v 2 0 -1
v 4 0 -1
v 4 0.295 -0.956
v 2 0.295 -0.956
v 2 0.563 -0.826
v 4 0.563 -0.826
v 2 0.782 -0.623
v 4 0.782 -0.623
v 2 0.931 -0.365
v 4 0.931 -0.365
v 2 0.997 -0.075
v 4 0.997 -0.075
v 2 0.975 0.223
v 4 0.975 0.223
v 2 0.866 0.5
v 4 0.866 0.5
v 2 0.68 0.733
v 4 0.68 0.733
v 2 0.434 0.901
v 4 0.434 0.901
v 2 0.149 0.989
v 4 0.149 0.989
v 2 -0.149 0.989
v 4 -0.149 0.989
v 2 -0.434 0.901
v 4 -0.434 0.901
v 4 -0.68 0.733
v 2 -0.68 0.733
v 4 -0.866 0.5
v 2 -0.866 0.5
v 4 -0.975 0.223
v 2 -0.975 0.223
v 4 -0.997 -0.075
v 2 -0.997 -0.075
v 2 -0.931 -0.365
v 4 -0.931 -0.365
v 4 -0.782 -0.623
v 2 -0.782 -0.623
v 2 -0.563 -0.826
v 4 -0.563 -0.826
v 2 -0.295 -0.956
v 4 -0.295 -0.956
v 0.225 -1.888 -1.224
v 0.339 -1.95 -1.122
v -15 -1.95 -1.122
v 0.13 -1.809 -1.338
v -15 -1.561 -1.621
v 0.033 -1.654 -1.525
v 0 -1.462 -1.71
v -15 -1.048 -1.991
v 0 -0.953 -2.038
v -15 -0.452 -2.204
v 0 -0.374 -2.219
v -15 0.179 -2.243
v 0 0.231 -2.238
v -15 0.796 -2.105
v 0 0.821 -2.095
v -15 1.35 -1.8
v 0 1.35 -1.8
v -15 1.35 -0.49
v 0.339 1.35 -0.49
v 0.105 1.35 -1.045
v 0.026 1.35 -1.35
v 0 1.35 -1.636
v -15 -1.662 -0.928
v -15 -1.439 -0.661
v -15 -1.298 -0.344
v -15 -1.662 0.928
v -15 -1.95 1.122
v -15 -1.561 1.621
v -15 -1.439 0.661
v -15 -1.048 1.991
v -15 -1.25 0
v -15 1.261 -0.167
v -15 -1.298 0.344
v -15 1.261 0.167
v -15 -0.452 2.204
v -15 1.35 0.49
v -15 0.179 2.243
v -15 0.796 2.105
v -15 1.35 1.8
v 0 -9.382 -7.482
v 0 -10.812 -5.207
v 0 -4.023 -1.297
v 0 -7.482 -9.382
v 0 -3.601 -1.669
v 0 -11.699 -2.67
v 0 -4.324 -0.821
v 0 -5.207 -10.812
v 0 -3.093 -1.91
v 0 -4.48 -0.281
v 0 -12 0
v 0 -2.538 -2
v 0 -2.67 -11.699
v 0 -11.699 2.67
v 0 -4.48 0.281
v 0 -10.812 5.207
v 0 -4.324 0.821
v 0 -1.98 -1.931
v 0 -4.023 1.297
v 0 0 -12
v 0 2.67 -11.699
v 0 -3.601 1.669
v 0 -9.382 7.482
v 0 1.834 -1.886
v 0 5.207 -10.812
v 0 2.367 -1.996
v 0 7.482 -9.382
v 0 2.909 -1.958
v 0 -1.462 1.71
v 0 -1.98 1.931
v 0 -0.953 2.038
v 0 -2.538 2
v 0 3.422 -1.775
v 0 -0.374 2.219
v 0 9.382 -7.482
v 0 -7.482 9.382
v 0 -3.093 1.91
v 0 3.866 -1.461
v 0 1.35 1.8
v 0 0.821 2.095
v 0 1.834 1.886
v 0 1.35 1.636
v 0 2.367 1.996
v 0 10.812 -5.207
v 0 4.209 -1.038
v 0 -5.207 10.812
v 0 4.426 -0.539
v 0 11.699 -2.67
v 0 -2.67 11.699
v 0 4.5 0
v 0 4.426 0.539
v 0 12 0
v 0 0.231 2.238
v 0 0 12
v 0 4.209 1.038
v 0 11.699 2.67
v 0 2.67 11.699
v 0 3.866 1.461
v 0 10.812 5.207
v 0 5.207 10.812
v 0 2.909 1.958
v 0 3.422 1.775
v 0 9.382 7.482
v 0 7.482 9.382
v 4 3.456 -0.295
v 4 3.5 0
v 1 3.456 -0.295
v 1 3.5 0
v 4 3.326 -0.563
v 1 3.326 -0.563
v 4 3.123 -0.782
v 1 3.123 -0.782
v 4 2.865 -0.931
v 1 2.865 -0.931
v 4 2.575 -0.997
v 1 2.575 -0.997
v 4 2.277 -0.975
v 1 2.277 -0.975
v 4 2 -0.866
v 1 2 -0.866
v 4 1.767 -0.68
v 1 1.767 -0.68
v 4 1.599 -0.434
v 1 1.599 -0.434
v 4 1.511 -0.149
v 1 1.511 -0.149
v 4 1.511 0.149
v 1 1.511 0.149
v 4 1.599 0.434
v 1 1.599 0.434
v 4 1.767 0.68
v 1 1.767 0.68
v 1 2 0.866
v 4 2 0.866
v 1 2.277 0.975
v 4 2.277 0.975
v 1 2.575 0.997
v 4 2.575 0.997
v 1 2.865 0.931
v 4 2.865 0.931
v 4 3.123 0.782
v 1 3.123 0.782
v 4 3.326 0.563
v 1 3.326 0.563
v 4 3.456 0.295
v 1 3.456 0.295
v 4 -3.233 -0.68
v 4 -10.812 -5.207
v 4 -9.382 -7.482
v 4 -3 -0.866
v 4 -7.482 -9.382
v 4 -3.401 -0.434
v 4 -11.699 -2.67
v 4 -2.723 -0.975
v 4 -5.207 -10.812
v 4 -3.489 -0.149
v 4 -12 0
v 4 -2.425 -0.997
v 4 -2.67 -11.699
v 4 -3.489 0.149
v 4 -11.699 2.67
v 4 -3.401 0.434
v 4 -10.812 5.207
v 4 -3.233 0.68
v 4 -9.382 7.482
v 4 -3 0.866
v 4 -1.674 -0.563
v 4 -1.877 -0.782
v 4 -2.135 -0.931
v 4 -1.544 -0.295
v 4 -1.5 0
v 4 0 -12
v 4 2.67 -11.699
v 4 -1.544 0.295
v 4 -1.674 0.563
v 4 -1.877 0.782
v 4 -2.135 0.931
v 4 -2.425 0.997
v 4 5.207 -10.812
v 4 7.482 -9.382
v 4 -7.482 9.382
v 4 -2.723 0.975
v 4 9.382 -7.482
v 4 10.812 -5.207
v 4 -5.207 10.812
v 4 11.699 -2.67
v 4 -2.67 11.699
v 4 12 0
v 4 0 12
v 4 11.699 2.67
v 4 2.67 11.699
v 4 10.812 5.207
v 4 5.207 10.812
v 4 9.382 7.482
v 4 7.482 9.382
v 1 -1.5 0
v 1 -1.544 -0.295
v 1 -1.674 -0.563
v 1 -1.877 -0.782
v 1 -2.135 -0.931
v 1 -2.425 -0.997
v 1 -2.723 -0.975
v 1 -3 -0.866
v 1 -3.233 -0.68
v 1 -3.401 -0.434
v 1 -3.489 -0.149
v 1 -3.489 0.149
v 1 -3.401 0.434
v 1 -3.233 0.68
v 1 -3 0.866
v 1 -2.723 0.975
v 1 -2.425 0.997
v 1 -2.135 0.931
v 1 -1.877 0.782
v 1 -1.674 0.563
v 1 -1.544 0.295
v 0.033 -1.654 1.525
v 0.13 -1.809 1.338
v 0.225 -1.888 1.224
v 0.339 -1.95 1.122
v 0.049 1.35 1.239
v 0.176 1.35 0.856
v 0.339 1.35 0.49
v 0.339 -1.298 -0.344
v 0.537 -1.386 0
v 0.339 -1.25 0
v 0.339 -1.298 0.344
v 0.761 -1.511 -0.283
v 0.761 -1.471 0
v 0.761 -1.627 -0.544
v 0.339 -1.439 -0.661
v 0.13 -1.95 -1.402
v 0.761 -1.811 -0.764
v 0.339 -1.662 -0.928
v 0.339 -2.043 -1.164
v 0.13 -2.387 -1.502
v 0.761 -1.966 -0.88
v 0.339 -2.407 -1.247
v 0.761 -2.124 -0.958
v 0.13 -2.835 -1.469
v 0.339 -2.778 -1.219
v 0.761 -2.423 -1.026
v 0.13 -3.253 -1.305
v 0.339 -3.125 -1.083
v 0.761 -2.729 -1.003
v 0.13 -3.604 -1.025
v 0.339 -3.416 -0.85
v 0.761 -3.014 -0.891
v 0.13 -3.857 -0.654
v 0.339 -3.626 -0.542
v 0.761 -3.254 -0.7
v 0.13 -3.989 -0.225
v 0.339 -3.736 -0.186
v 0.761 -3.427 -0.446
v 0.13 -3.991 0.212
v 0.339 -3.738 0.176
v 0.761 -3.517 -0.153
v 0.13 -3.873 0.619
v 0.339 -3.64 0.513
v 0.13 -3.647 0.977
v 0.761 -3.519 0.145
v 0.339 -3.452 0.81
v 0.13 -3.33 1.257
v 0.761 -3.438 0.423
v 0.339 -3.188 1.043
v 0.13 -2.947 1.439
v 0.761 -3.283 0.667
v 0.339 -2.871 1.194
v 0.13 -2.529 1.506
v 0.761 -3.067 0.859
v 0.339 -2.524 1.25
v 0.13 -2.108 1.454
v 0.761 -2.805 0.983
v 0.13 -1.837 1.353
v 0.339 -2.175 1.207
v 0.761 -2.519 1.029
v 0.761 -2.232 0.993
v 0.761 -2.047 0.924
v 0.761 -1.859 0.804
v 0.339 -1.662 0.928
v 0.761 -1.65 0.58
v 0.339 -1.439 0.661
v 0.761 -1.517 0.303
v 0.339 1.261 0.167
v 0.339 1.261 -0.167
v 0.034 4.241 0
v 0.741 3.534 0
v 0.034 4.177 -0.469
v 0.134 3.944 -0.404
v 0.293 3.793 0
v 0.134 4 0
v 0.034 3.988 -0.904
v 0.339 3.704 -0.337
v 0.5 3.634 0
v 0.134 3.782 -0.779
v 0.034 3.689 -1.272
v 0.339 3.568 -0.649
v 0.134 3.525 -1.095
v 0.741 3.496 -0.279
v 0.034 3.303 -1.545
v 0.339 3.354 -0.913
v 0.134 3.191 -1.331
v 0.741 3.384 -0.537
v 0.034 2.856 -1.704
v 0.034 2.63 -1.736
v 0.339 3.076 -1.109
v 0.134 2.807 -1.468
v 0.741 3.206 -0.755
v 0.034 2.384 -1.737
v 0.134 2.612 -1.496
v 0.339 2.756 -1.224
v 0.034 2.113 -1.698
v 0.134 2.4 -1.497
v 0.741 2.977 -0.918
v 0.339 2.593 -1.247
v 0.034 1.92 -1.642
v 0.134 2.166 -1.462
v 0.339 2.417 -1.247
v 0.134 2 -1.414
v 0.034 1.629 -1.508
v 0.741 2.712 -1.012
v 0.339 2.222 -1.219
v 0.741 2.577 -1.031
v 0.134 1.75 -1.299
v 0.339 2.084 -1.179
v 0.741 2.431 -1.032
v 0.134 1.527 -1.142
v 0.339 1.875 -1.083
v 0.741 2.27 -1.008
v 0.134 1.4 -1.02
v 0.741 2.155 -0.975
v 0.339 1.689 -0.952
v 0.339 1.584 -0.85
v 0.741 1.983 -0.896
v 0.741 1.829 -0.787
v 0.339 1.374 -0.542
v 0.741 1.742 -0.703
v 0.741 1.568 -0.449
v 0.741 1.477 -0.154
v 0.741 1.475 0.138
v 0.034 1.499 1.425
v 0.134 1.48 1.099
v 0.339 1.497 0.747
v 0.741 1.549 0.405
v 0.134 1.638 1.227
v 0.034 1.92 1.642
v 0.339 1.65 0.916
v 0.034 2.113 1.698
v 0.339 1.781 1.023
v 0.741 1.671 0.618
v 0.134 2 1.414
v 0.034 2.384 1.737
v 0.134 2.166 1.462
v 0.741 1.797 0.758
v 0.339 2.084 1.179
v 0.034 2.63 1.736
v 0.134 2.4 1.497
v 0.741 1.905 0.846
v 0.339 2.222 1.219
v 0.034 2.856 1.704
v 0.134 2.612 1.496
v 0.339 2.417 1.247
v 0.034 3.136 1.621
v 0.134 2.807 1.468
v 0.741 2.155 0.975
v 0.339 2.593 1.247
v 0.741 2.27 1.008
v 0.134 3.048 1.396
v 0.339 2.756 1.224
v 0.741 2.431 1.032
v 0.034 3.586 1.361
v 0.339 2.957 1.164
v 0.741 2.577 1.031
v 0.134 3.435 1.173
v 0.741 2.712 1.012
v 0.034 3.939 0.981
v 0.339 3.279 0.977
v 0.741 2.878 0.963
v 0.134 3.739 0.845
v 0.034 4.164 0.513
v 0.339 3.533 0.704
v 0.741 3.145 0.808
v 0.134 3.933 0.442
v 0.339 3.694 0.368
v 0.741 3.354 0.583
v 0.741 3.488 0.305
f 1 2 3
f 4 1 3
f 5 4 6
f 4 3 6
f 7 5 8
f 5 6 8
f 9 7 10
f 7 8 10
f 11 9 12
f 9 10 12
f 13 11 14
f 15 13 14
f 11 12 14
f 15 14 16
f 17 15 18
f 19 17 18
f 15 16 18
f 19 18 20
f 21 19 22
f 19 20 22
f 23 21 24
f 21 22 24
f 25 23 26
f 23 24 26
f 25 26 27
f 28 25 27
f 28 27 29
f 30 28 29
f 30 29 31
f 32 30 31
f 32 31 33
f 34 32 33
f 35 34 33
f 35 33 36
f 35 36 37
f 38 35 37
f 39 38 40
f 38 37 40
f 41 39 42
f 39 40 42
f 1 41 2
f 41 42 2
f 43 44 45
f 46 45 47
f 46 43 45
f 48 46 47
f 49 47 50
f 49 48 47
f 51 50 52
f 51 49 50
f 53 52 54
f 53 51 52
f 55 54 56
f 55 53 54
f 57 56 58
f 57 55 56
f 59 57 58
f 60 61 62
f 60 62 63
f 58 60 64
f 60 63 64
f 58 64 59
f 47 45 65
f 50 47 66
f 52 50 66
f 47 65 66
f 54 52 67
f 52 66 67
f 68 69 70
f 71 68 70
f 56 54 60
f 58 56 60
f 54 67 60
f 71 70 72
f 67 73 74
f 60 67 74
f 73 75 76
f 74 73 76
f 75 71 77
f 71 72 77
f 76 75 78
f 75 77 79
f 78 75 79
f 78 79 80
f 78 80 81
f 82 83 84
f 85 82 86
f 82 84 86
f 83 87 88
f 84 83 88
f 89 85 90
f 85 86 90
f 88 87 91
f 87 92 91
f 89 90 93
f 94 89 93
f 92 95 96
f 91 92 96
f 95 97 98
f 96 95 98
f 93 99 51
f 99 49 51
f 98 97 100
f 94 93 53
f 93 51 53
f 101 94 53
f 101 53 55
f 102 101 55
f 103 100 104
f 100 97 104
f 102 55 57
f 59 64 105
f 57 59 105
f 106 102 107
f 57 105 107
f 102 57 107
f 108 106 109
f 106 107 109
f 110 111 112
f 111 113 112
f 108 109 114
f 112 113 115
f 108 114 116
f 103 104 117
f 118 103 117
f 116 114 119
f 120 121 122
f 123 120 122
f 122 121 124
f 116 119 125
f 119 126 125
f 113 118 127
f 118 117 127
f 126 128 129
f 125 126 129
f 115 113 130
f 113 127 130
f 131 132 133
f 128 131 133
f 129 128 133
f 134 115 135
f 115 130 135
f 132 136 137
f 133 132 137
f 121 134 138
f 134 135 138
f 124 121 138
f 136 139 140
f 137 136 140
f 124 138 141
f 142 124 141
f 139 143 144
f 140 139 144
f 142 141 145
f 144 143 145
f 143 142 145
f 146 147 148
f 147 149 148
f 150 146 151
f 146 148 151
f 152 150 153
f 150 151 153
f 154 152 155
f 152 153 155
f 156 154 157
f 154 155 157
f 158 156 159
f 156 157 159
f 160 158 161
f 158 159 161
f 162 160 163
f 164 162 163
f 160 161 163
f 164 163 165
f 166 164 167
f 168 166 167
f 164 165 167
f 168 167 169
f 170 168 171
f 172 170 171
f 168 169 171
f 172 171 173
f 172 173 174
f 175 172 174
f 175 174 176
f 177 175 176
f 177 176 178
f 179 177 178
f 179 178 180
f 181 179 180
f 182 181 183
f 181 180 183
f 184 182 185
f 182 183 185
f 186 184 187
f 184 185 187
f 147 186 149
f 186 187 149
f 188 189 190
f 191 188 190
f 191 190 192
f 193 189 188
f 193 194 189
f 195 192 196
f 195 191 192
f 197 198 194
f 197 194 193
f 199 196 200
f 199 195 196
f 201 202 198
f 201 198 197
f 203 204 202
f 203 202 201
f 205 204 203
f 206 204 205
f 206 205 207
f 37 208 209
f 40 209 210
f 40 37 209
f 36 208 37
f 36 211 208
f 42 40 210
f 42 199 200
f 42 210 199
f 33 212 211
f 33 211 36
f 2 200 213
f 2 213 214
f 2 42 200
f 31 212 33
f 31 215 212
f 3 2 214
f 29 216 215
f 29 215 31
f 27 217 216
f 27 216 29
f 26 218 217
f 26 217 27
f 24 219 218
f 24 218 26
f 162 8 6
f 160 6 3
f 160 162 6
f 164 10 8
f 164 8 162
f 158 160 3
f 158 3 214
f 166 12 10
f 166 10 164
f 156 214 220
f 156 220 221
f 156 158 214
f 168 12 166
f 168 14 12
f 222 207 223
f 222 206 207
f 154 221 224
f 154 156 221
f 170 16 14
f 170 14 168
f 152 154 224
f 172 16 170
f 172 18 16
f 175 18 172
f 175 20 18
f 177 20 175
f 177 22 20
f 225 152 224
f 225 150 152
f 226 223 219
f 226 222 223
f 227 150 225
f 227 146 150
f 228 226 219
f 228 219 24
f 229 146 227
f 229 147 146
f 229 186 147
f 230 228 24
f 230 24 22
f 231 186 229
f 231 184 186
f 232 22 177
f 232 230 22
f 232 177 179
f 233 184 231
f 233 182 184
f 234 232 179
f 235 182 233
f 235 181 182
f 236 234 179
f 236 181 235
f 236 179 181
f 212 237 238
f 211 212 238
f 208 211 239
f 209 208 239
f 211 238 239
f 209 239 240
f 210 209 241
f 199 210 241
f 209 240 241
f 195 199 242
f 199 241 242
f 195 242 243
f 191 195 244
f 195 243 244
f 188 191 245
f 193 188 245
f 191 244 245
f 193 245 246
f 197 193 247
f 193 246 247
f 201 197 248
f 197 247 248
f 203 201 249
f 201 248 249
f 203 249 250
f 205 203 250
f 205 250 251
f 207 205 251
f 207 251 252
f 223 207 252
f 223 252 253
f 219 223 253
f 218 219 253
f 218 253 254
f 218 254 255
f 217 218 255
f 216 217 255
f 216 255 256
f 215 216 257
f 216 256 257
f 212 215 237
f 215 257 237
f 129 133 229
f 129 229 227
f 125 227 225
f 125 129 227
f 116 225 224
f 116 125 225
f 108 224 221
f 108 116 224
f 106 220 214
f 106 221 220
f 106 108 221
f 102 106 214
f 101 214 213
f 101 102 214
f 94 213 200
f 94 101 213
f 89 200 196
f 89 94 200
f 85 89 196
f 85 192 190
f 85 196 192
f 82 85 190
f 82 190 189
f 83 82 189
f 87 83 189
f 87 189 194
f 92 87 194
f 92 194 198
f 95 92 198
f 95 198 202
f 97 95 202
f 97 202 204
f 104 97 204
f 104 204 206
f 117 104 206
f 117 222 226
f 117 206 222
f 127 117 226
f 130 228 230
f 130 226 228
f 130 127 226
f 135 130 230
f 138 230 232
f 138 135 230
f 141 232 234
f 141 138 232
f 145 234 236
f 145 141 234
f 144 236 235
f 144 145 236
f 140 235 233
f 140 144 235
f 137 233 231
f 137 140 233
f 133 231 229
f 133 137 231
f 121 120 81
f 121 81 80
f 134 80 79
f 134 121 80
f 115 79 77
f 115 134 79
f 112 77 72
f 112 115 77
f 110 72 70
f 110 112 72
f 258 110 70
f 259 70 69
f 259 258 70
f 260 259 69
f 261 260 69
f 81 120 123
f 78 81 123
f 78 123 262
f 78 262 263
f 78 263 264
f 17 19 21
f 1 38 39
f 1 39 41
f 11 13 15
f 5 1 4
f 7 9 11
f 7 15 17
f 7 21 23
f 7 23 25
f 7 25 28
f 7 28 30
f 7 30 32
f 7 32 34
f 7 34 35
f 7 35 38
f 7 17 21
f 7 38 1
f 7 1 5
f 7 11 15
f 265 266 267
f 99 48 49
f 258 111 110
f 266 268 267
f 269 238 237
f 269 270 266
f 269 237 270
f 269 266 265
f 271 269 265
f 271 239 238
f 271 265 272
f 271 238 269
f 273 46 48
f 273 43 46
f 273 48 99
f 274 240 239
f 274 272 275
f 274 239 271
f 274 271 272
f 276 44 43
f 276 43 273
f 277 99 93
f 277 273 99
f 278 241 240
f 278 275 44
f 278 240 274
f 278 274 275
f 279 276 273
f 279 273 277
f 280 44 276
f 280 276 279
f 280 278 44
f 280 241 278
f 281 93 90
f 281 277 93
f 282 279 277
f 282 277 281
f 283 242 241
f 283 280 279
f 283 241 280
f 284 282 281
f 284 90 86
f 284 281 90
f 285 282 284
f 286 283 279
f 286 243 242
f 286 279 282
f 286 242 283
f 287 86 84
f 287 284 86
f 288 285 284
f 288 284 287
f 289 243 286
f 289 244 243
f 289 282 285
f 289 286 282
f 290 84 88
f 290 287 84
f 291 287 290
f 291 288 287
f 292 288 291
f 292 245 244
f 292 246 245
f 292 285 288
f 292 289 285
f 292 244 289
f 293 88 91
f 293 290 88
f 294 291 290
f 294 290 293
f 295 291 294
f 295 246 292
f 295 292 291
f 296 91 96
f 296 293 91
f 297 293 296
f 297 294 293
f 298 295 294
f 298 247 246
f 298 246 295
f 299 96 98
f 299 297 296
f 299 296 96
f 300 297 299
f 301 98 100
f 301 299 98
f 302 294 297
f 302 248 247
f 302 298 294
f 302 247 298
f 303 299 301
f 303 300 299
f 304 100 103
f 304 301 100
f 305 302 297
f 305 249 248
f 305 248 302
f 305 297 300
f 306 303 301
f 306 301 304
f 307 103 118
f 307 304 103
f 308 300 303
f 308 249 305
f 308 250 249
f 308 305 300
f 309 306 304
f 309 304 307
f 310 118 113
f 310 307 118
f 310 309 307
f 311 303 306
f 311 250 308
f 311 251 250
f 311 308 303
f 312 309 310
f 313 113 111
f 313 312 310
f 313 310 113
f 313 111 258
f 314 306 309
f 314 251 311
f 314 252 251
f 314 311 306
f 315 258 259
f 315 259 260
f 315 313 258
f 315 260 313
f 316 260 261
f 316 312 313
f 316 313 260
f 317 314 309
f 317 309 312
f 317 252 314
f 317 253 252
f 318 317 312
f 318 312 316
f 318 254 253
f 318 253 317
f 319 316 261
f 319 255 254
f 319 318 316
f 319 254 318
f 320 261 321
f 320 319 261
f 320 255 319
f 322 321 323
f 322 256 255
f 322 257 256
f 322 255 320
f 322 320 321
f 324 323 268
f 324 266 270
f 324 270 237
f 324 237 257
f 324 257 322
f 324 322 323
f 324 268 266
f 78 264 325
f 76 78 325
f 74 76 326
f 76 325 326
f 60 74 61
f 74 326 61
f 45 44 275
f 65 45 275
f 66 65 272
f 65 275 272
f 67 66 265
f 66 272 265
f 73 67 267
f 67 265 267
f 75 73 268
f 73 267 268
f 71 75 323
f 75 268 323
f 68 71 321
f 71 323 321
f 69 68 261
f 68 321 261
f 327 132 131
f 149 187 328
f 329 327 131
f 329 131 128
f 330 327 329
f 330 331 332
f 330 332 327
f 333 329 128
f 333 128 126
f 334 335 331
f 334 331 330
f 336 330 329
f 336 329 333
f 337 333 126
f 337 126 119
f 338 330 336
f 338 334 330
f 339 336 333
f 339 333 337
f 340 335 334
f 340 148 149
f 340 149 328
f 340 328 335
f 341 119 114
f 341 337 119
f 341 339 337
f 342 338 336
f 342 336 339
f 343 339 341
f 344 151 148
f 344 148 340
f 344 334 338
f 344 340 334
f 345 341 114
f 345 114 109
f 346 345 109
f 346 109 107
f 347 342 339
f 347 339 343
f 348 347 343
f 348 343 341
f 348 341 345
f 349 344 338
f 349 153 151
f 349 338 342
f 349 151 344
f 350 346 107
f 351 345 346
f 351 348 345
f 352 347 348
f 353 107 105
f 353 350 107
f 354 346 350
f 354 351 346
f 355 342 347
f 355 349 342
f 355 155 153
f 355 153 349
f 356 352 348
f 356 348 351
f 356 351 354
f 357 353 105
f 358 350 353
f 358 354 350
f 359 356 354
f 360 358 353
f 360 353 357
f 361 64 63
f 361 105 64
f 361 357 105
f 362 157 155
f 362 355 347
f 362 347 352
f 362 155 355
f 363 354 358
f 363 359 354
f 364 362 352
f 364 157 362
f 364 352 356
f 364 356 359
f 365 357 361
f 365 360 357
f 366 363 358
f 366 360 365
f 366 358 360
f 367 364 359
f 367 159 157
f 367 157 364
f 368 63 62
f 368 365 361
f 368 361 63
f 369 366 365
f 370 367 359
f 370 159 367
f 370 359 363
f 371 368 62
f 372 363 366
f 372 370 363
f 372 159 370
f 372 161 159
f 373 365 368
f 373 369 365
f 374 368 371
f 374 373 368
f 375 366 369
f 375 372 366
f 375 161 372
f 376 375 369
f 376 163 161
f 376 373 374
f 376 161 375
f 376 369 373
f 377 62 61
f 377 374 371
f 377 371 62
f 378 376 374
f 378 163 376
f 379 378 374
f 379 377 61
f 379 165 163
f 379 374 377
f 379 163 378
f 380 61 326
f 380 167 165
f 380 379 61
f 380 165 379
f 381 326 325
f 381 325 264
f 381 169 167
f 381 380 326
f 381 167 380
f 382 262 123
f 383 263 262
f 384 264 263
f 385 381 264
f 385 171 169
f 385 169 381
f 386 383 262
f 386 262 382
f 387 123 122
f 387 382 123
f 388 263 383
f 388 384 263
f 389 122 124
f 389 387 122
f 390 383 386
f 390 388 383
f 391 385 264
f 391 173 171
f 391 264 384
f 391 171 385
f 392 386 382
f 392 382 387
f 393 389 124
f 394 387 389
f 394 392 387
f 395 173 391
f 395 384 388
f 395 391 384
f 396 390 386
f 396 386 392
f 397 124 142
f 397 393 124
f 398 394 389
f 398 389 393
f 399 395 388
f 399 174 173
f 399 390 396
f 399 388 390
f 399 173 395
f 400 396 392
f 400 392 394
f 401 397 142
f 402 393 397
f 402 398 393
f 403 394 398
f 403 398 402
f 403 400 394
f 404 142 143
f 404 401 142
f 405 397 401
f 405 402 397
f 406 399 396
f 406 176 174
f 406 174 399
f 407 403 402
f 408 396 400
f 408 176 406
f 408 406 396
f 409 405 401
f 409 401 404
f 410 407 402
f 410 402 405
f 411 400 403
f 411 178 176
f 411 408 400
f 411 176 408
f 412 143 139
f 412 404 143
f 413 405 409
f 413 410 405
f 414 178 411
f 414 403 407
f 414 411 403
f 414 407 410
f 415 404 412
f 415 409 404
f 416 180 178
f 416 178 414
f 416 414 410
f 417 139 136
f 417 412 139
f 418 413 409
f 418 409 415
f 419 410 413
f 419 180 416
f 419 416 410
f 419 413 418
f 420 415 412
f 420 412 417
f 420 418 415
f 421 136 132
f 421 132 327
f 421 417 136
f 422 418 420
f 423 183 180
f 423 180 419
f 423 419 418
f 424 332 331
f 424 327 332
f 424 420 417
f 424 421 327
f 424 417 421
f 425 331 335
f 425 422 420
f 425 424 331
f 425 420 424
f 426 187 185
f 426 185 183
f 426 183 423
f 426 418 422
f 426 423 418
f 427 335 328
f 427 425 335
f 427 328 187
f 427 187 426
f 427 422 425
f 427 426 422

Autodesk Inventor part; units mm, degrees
ref_plane "YZ Plane" through (0, 0, 0) normal (1, 0, 0) x (0, 1, 0)
ref_plane "XZ Plane" through (0, 0, 0) normal (0, 1, 0) x (-1, 0, 0)
ref_plane "XY Plane" through (0, 0, 0) normal (0, 0, 1) x (1, 0, 0)
sketch "Sketch1" plane through (0, 0, 0) normal (1, 0, 0) x (0, 1, 0)
  circle A0 centre (0, 0) radius 12
  circle A1 centre (0, 0) radius 2.25
  line L0 (16, 0) -> (-16, 0) construction
  circle A2 centre (-2.5, 0) radius 1
  circle A3 centre (2.5, 0) radius 1
  line L1 (1.35, 1.8) -> (1.35, -1.8)
  circle A4 centre (2.5, 0) radius 1.25
  circle A5 centre (-2.5, 0) radius 1.25
  point P0 (-2.0625, 0.8992)
  point P1 (-2.0625, -0.8992)
  point P2 (-1.95, 1.1225)
  point P3 (-1.95, -1.1225)
  point P4 (1.35, -0.4899)
  point P5 (1.35, 0.4899)
  dimension "d0" = 24
  dimension "d1" = 4.5
  dimension "d2" = 2
  dimension "d3" = 2
  dimension "d9" = 2.5
  dimension "d10" = 2.5
extrude "Extrusion1" add sketch "Sketch1" along normal blind 4 contours A0 | A3 A1 A4 L1 | A1 A4 A3 | A4 L1 A1 | A1 L1 A4 | L1 A4 A1 A5 | L1 A4 | A5 A1 A2 | A1 A2 A5
extrude "Extrusion3" add sketch "Sketch1" against normal blind 15 contours L1 A4 A1 A5
fillet "Fillet2" radius 1 2 edges at (0, -3.5, 0) (0, 1.5, 0)
sketch "Sketch2" plane through (4, 0, 0) normal (1, 0, 0) x (0, 0, -1)
  circle A0 centre (0, 0) radius 1
  dimension "d15" = 2
extrude "Extrusion4" cut sketch "Sketch2" against normal blind 2
properties part number "engine_gear_connector"
